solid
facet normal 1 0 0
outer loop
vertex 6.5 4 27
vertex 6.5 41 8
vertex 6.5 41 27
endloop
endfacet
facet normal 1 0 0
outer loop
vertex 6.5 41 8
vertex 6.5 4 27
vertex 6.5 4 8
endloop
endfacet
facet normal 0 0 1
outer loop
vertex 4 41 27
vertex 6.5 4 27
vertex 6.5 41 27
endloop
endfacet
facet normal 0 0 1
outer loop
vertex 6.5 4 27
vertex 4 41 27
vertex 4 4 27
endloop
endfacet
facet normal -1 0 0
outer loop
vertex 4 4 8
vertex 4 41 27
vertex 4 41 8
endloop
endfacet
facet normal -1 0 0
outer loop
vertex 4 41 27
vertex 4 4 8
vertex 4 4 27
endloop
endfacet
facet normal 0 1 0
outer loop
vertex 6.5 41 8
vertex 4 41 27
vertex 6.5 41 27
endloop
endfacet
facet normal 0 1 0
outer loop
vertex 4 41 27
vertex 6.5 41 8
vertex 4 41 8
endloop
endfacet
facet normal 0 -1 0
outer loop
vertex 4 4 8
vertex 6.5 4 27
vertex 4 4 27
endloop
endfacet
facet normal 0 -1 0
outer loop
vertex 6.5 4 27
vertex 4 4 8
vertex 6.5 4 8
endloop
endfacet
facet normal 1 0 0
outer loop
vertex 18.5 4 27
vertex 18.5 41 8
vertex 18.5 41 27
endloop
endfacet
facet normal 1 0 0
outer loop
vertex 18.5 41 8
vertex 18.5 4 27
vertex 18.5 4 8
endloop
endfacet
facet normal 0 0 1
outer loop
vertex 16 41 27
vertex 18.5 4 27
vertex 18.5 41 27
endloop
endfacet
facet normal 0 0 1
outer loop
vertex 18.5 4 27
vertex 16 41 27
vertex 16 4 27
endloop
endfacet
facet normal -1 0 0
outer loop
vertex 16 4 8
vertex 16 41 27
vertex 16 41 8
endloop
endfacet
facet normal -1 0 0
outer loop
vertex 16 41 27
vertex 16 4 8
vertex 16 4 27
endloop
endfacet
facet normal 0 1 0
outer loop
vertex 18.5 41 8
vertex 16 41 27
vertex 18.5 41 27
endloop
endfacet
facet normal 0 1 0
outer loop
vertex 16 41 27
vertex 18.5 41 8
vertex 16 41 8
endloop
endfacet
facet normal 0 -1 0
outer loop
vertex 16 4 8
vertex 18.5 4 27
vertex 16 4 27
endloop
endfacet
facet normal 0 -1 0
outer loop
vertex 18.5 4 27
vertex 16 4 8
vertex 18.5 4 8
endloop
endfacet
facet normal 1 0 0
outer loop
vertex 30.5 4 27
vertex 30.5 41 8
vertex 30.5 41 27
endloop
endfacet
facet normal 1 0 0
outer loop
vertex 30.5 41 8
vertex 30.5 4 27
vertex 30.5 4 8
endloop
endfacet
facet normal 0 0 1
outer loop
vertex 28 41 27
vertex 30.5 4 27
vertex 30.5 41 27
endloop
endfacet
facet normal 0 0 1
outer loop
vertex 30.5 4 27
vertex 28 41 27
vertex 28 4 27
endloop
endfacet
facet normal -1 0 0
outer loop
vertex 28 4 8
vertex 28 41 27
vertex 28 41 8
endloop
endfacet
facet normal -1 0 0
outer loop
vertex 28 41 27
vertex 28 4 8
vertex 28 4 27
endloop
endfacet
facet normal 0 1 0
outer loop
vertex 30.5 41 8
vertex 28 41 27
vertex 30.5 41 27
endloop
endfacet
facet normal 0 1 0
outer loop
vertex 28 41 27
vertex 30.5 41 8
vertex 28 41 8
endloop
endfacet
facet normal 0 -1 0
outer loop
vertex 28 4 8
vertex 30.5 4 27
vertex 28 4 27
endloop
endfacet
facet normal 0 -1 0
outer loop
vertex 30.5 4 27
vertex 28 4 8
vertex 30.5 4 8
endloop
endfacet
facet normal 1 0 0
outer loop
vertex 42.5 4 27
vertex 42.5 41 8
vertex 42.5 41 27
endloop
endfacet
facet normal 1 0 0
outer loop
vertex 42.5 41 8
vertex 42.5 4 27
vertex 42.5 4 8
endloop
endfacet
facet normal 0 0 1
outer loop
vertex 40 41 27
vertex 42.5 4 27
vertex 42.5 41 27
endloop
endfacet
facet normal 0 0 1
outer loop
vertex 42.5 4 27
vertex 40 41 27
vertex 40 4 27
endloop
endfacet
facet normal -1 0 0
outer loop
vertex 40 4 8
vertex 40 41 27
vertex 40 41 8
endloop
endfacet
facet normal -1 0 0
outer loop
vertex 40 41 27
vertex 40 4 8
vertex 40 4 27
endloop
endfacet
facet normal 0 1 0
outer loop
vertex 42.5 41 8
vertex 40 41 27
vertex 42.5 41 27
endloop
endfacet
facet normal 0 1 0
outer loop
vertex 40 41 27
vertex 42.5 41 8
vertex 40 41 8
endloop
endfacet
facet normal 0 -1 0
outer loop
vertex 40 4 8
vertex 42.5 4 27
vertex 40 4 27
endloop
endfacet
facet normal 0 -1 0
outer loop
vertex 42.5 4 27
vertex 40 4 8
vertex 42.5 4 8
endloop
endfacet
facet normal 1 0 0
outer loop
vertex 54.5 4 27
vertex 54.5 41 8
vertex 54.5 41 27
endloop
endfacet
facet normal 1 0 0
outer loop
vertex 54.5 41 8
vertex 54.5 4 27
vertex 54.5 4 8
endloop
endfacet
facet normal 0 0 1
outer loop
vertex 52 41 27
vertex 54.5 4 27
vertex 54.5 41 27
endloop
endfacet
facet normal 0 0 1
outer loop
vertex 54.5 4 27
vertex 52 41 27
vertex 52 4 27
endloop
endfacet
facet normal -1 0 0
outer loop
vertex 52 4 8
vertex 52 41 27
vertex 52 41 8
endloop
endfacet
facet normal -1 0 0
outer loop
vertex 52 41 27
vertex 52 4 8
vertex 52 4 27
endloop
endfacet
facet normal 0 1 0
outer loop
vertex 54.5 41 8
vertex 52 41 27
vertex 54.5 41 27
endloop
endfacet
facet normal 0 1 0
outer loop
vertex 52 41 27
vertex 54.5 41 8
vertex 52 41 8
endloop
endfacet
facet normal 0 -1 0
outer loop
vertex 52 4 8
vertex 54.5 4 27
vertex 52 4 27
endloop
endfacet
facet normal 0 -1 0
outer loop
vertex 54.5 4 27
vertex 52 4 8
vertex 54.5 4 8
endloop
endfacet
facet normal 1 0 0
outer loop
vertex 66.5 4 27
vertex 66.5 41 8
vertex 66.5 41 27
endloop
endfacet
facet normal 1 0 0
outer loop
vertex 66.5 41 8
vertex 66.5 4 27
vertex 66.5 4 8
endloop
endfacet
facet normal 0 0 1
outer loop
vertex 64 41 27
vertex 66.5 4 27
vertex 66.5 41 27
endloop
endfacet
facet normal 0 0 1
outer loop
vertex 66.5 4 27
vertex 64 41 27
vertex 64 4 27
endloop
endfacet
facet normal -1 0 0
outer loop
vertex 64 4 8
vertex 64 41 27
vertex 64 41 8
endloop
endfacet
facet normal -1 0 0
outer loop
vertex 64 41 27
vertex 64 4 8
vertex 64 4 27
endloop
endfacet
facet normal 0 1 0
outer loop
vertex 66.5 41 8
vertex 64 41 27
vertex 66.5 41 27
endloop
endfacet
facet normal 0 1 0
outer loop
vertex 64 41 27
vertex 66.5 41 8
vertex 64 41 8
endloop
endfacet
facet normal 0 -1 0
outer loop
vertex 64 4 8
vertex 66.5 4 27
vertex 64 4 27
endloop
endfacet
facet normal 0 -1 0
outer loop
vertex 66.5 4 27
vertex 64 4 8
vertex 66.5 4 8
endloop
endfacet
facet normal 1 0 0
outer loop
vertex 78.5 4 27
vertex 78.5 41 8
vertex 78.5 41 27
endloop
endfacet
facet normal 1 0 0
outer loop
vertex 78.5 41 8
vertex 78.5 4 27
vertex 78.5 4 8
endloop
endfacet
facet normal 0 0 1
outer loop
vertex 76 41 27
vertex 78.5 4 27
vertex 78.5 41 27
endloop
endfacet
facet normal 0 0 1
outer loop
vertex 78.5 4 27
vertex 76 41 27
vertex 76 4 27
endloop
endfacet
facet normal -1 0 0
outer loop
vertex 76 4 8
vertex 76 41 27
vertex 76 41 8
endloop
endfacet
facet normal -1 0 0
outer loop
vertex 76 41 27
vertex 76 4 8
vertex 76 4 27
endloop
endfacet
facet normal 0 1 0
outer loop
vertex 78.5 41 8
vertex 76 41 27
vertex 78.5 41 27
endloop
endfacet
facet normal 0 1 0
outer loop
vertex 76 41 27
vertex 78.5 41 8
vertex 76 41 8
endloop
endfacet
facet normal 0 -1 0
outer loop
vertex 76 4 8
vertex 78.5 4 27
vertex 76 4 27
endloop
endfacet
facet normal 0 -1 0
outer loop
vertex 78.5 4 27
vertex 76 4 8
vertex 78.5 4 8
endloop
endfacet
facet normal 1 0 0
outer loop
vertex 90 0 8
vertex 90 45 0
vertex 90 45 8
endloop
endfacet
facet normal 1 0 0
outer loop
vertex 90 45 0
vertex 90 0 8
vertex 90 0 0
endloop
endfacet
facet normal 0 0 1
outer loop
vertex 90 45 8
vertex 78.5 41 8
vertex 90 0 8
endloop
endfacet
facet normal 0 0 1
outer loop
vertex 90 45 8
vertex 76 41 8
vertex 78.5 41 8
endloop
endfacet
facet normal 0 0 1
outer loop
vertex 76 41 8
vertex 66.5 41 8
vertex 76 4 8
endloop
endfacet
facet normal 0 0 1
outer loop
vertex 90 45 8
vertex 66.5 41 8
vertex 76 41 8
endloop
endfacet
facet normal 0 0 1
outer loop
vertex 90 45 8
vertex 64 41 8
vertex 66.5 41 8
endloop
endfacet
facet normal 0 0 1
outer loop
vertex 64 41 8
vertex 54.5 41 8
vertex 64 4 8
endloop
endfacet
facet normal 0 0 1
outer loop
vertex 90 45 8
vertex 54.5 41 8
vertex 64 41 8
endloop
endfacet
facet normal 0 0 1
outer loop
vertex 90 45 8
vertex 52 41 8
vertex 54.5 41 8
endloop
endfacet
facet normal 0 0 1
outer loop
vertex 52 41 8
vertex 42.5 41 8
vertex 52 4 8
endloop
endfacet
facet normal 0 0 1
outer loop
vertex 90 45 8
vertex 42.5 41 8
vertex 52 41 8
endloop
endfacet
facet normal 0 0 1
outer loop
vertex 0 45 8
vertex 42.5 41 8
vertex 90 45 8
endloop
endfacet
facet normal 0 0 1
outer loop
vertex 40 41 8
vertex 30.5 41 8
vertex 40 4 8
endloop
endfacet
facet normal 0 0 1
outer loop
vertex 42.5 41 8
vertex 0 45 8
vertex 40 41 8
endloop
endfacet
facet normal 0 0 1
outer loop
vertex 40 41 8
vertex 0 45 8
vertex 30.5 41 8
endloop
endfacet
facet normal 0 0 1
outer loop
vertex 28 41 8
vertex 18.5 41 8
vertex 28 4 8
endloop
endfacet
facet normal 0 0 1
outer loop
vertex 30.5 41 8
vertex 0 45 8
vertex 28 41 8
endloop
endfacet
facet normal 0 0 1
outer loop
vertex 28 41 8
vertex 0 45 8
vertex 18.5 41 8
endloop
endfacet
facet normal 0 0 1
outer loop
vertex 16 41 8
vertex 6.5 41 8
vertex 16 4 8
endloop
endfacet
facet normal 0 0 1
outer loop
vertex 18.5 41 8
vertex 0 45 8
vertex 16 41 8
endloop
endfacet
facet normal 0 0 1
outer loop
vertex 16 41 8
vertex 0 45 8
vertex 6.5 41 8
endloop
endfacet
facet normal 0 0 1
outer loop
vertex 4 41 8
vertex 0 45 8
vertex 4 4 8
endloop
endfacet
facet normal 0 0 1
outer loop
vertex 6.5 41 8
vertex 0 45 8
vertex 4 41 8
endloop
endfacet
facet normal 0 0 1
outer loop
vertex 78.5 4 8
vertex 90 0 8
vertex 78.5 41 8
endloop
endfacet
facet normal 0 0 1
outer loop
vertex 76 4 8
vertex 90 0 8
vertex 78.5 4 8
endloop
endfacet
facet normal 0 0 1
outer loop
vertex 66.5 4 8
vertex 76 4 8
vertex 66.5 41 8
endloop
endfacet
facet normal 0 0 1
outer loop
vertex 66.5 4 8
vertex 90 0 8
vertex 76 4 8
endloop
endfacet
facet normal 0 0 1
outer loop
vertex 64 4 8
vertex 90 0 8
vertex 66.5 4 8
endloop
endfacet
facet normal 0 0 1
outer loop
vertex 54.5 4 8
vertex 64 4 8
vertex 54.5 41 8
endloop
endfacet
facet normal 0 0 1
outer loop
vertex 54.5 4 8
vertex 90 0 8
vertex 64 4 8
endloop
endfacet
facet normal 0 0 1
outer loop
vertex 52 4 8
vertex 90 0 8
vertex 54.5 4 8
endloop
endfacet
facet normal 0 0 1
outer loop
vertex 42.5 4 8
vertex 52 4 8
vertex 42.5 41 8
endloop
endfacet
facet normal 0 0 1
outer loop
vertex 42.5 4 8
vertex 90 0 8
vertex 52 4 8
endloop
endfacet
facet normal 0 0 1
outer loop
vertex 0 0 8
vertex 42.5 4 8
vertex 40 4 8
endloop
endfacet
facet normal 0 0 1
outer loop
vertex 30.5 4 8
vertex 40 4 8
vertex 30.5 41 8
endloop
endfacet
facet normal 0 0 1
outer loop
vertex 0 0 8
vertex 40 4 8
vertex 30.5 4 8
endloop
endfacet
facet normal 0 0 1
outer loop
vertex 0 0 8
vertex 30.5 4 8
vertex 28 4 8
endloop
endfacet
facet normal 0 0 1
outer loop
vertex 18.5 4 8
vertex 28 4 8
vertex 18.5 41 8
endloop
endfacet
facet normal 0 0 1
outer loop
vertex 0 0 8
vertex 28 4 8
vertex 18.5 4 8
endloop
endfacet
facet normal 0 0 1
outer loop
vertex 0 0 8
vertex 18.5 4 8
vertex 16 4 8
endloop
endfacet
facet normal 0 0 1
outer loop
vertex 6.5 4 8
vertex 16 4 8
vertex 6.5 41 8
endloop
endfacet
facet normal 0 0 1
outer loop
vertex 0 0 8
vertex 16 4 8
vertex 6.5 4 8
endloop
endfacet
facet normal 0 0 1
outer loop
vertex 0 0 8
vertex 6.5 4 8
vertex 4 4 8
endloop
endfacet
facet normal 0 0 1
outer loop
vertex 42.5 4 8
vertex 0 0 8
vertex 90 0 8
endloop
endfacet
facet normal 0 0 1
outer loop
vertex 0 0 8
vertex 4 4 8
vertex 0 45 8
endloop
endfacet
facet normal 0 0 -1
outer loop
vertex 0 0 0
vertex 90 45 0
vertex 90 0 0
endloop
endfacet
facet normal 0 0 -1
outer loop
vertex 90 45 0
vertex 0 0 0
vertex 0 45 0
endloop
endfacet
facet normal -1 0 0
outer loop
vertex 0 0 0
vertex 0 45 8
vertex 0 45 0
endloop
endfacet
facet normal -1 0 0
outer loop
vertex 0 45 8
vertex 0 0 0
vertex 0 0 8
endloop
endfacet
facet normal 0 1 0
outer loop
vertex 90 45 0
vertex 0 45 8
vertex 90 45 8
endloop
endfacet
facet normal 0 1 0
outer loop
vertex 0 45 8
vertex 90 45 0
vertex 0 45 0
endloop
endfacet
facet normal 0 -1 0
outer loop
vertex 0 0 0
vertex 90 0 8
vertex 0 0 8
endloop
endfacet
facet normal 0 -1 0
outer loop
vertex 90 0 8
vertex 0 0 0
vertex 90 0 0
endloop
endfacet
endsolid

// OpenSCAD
$fn = 32;

// ----------------------------------------------------------------------
// Heatsink: uniform fin block
// ----------------------------------------------------------------------

// --- parameters (mm) ---
base_l = 90;              // base length, X
base_w = 45;              // base width, Y
base_t = 8;               // base plate thickness
fin_h = 20;               // fin height above the base
fin_t = 2.5;              // fin thickness
edge = 4;                 // margin from the base ends
pitch = 12;               // fin pitch
fit_tol = 0.05;           // tolerance for press fits, mm
free_tol = 0.2;           // tolerance for clearance fits, mm

n_fins = floor((base_l - 2 * edge - fin_t) / pitch) + 1;  // fin count
total_h = base_t + fin_h - 1;  // overall height

union() {
  cube([base_l, base_w, base_t]);
  for (i = [0 : n_fins - 1])
    translate([edge + i * pitch, edge, base_t - 1])
      cube([fin_t, base_w - 2 * edge, fin_h]);
}
